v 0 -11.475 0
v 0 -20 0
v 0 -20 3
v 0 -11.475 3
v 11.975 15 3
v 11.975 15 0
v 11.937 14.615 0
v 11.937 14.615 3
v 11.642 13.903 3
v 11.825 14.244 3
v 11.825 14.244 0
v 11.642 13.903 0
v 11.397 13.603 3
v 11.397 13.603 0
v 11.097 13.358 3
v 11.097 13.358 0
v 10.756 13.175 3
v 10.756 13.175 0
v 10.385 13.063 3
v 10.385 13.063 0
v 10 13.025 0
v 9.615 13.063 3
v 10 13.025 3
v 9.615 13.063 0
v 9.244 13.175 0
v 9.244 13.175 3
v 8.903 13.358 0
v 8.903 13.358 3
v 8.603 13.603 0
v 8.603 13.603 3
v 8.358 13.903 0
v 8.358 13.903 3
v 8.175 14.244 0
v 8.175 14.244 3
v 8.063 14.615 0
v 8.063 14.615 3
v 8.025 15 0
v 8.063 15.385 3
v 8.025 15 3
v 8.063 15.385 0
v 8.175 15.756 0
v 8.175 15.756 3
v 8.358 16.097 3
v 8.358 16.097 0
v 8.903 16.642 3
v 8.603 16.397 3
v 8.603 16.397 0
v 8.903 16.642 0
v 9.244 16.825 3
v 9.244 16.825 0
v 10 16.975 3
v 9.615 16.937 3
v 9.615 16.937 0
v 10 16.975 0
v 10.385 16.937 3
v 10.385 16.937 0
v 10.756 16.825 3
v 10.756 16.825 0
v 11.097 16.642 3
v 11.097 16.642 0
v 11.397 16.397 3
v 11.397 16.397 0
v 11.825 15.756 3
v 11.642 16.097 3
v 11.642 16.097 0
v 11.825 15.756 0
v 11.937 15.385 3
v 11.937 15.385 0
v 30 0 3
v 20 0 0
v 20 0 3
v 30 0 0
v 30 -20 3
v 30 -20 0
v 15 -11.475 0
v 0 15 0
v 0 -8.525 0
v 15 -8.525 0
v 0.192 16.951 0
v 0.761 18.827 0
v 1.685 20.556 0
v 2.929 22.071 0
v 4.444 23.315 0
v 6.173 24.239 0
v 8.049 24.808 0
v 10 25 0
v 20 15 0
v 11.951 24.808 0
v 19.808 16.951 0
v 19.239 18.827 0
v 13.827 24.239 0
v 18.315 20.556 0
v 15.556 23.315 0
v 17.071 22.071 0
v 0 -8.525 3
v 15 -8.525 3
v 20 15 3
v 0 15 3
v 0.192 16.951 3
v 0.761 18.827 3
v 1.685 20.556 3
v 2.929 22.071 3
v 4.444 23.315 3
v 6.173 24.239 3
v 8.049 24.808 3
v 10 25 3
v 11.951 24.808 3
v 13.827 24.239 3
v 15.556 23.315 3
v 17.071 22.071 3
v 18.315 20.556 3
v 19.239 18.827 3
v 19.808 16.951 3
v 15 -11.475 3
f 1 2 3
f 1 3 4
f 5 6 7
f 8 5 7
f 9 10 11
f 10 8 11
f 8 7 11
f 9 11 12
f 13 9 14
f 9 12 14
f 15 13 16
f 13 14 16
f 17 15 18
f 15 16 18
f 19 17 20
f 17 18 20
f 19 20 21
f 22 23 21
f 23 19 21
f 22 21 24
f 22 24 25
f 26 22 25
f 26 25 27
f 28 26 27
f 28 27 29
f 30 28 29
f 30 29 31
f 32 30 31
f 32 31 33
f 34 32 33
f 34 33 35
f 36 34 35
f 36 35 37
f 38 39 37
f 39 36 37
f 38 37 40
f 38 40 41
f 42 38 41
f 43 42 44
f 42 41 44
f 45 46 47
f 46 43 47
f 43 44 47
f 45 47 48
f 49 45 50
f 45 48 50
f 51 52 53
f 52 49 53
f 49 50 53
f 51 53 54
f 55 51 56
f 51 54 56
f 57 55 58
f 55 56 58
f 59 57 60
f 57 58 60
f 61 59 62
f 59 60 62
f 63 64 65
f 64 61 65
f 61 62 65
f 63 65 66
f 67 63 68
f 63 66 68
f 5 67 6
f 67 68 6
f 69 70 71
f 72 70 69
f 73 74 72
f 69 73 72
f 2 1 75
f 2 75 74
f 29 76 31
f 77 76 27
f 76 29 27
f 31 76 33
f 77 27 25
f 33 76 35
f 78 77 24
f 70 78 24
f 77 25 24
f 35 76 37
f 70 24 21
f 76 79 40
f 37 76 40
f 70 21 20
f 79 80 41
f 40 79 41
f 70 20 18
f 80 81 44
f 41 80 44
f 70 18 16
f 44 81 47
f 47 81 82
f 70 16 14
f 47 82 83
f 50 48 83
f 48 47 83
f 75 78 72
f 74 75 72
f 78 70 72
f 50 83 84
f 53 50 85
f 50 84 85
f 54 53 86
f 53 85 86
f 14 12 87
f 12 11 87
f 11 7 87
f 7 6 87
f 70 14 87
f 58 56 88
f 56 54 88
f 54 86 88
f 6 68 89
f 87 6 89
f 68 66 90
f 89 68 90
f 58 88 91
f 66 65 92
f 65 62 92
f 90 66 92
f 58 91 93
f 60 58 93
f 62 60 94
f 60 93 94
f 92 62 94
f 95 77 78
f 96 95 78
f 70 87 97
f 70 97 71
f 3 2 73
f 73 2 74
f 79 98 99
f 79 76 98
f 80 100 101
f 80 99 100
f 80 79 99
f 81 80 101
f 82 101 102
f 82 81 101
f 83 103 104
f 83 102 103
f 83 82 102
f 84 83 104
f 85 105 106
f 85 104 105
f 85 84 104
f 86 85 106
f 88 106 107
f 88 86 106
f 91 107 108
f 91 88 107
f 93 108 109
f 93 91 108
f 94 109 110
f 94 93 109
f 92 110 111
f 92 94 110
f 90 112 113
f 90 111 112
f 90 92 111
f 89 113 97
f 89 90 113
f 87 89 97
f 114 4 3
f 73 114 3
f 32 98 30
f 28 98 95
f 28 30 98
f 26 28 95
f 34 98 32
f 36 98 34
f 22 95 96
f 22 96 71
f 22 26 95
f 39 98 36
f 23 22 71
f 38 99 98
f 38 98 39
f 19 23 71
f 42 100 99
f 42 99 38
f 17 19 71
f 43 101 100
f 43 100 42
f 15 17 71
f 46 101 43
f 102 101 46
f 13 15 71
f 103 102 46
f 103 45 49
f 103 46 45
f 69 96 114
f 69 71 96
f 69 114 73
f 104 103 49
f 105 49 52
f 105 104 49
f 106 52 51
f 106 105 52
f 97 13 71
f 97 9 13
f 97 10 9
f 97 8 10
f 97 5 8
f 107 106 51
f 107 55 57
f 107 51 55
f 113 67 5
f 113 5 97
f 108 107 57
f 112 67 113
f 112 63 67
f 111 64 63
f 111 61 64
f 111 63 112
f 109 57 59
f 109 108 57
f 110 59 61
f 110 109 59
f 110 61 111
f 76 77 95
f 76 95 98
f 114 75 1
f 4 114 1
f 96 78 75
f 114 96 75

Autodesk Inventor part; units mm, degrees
ref_plane "YZ Plane" through (0, 0, 0) normal (1, 0, 0) x (0, 1, 0)
ref_plane "XZ Plane" through (0, 0, 0) normal (0, 1, 0) x (-1, 0, 0)
ref_plane "XY Plane" through (0, 0, 0) normal (0, 0, 1) x (1, 0, 0)
sketch "草圖1" plane through (0, 0, 0) normal (0, 0, 1) x (1, 0, 0)
  line L0 (0, 0) -> (15, 0)
  line L1 (15, -20) -> (0, -20)
  line L2 (0, -20) -> (0, 0)
  line L3 (0, -8.525) -> (15, -8.525)
  line L4 (15, -8.525) -> (15, -11.475)
  line L5 (15, -11.475) -> (0, -11.475)
  line L6 (0, -11.475) -> (0, -8.525)
  line L7 (15, 0) -> (60, 0)
  line L8 (15, 0) -> (15, -20)
  line L9 (15, -20) -> (30, -20)
  circle A0 centre (10, 15) radius 1.975
  line L10 (30, -20) -> (30, 0)
  line L11 (15, 0) -> (15, -20)
  line L12 (0, 0) -> (0, 15)
  circle A1 centre (10, 15) radius 10
  line L13 (20, 15) -> (20, 0)
  point P0 (15, -10)
  point P1 (0, -10)
  dimension "d0" = 20
  dimension "d3" = 2.95
  dimension "d4" = 0
  dimension "d7" = 15
  dimension "d9" = 3.95
  dimension "d15" = 15
  dimension "d17" = 15
  dimension "d18" = 10
  dimension "d19" = 20
extrude "擠出1" add sketch "草圖1" along normal blind 3 contours L12 A1 L13 L7 L0 | L0 L8 L3 L2 | L7 L10 L9 L8 L4 | A1 | L5 L8 L1 L2
